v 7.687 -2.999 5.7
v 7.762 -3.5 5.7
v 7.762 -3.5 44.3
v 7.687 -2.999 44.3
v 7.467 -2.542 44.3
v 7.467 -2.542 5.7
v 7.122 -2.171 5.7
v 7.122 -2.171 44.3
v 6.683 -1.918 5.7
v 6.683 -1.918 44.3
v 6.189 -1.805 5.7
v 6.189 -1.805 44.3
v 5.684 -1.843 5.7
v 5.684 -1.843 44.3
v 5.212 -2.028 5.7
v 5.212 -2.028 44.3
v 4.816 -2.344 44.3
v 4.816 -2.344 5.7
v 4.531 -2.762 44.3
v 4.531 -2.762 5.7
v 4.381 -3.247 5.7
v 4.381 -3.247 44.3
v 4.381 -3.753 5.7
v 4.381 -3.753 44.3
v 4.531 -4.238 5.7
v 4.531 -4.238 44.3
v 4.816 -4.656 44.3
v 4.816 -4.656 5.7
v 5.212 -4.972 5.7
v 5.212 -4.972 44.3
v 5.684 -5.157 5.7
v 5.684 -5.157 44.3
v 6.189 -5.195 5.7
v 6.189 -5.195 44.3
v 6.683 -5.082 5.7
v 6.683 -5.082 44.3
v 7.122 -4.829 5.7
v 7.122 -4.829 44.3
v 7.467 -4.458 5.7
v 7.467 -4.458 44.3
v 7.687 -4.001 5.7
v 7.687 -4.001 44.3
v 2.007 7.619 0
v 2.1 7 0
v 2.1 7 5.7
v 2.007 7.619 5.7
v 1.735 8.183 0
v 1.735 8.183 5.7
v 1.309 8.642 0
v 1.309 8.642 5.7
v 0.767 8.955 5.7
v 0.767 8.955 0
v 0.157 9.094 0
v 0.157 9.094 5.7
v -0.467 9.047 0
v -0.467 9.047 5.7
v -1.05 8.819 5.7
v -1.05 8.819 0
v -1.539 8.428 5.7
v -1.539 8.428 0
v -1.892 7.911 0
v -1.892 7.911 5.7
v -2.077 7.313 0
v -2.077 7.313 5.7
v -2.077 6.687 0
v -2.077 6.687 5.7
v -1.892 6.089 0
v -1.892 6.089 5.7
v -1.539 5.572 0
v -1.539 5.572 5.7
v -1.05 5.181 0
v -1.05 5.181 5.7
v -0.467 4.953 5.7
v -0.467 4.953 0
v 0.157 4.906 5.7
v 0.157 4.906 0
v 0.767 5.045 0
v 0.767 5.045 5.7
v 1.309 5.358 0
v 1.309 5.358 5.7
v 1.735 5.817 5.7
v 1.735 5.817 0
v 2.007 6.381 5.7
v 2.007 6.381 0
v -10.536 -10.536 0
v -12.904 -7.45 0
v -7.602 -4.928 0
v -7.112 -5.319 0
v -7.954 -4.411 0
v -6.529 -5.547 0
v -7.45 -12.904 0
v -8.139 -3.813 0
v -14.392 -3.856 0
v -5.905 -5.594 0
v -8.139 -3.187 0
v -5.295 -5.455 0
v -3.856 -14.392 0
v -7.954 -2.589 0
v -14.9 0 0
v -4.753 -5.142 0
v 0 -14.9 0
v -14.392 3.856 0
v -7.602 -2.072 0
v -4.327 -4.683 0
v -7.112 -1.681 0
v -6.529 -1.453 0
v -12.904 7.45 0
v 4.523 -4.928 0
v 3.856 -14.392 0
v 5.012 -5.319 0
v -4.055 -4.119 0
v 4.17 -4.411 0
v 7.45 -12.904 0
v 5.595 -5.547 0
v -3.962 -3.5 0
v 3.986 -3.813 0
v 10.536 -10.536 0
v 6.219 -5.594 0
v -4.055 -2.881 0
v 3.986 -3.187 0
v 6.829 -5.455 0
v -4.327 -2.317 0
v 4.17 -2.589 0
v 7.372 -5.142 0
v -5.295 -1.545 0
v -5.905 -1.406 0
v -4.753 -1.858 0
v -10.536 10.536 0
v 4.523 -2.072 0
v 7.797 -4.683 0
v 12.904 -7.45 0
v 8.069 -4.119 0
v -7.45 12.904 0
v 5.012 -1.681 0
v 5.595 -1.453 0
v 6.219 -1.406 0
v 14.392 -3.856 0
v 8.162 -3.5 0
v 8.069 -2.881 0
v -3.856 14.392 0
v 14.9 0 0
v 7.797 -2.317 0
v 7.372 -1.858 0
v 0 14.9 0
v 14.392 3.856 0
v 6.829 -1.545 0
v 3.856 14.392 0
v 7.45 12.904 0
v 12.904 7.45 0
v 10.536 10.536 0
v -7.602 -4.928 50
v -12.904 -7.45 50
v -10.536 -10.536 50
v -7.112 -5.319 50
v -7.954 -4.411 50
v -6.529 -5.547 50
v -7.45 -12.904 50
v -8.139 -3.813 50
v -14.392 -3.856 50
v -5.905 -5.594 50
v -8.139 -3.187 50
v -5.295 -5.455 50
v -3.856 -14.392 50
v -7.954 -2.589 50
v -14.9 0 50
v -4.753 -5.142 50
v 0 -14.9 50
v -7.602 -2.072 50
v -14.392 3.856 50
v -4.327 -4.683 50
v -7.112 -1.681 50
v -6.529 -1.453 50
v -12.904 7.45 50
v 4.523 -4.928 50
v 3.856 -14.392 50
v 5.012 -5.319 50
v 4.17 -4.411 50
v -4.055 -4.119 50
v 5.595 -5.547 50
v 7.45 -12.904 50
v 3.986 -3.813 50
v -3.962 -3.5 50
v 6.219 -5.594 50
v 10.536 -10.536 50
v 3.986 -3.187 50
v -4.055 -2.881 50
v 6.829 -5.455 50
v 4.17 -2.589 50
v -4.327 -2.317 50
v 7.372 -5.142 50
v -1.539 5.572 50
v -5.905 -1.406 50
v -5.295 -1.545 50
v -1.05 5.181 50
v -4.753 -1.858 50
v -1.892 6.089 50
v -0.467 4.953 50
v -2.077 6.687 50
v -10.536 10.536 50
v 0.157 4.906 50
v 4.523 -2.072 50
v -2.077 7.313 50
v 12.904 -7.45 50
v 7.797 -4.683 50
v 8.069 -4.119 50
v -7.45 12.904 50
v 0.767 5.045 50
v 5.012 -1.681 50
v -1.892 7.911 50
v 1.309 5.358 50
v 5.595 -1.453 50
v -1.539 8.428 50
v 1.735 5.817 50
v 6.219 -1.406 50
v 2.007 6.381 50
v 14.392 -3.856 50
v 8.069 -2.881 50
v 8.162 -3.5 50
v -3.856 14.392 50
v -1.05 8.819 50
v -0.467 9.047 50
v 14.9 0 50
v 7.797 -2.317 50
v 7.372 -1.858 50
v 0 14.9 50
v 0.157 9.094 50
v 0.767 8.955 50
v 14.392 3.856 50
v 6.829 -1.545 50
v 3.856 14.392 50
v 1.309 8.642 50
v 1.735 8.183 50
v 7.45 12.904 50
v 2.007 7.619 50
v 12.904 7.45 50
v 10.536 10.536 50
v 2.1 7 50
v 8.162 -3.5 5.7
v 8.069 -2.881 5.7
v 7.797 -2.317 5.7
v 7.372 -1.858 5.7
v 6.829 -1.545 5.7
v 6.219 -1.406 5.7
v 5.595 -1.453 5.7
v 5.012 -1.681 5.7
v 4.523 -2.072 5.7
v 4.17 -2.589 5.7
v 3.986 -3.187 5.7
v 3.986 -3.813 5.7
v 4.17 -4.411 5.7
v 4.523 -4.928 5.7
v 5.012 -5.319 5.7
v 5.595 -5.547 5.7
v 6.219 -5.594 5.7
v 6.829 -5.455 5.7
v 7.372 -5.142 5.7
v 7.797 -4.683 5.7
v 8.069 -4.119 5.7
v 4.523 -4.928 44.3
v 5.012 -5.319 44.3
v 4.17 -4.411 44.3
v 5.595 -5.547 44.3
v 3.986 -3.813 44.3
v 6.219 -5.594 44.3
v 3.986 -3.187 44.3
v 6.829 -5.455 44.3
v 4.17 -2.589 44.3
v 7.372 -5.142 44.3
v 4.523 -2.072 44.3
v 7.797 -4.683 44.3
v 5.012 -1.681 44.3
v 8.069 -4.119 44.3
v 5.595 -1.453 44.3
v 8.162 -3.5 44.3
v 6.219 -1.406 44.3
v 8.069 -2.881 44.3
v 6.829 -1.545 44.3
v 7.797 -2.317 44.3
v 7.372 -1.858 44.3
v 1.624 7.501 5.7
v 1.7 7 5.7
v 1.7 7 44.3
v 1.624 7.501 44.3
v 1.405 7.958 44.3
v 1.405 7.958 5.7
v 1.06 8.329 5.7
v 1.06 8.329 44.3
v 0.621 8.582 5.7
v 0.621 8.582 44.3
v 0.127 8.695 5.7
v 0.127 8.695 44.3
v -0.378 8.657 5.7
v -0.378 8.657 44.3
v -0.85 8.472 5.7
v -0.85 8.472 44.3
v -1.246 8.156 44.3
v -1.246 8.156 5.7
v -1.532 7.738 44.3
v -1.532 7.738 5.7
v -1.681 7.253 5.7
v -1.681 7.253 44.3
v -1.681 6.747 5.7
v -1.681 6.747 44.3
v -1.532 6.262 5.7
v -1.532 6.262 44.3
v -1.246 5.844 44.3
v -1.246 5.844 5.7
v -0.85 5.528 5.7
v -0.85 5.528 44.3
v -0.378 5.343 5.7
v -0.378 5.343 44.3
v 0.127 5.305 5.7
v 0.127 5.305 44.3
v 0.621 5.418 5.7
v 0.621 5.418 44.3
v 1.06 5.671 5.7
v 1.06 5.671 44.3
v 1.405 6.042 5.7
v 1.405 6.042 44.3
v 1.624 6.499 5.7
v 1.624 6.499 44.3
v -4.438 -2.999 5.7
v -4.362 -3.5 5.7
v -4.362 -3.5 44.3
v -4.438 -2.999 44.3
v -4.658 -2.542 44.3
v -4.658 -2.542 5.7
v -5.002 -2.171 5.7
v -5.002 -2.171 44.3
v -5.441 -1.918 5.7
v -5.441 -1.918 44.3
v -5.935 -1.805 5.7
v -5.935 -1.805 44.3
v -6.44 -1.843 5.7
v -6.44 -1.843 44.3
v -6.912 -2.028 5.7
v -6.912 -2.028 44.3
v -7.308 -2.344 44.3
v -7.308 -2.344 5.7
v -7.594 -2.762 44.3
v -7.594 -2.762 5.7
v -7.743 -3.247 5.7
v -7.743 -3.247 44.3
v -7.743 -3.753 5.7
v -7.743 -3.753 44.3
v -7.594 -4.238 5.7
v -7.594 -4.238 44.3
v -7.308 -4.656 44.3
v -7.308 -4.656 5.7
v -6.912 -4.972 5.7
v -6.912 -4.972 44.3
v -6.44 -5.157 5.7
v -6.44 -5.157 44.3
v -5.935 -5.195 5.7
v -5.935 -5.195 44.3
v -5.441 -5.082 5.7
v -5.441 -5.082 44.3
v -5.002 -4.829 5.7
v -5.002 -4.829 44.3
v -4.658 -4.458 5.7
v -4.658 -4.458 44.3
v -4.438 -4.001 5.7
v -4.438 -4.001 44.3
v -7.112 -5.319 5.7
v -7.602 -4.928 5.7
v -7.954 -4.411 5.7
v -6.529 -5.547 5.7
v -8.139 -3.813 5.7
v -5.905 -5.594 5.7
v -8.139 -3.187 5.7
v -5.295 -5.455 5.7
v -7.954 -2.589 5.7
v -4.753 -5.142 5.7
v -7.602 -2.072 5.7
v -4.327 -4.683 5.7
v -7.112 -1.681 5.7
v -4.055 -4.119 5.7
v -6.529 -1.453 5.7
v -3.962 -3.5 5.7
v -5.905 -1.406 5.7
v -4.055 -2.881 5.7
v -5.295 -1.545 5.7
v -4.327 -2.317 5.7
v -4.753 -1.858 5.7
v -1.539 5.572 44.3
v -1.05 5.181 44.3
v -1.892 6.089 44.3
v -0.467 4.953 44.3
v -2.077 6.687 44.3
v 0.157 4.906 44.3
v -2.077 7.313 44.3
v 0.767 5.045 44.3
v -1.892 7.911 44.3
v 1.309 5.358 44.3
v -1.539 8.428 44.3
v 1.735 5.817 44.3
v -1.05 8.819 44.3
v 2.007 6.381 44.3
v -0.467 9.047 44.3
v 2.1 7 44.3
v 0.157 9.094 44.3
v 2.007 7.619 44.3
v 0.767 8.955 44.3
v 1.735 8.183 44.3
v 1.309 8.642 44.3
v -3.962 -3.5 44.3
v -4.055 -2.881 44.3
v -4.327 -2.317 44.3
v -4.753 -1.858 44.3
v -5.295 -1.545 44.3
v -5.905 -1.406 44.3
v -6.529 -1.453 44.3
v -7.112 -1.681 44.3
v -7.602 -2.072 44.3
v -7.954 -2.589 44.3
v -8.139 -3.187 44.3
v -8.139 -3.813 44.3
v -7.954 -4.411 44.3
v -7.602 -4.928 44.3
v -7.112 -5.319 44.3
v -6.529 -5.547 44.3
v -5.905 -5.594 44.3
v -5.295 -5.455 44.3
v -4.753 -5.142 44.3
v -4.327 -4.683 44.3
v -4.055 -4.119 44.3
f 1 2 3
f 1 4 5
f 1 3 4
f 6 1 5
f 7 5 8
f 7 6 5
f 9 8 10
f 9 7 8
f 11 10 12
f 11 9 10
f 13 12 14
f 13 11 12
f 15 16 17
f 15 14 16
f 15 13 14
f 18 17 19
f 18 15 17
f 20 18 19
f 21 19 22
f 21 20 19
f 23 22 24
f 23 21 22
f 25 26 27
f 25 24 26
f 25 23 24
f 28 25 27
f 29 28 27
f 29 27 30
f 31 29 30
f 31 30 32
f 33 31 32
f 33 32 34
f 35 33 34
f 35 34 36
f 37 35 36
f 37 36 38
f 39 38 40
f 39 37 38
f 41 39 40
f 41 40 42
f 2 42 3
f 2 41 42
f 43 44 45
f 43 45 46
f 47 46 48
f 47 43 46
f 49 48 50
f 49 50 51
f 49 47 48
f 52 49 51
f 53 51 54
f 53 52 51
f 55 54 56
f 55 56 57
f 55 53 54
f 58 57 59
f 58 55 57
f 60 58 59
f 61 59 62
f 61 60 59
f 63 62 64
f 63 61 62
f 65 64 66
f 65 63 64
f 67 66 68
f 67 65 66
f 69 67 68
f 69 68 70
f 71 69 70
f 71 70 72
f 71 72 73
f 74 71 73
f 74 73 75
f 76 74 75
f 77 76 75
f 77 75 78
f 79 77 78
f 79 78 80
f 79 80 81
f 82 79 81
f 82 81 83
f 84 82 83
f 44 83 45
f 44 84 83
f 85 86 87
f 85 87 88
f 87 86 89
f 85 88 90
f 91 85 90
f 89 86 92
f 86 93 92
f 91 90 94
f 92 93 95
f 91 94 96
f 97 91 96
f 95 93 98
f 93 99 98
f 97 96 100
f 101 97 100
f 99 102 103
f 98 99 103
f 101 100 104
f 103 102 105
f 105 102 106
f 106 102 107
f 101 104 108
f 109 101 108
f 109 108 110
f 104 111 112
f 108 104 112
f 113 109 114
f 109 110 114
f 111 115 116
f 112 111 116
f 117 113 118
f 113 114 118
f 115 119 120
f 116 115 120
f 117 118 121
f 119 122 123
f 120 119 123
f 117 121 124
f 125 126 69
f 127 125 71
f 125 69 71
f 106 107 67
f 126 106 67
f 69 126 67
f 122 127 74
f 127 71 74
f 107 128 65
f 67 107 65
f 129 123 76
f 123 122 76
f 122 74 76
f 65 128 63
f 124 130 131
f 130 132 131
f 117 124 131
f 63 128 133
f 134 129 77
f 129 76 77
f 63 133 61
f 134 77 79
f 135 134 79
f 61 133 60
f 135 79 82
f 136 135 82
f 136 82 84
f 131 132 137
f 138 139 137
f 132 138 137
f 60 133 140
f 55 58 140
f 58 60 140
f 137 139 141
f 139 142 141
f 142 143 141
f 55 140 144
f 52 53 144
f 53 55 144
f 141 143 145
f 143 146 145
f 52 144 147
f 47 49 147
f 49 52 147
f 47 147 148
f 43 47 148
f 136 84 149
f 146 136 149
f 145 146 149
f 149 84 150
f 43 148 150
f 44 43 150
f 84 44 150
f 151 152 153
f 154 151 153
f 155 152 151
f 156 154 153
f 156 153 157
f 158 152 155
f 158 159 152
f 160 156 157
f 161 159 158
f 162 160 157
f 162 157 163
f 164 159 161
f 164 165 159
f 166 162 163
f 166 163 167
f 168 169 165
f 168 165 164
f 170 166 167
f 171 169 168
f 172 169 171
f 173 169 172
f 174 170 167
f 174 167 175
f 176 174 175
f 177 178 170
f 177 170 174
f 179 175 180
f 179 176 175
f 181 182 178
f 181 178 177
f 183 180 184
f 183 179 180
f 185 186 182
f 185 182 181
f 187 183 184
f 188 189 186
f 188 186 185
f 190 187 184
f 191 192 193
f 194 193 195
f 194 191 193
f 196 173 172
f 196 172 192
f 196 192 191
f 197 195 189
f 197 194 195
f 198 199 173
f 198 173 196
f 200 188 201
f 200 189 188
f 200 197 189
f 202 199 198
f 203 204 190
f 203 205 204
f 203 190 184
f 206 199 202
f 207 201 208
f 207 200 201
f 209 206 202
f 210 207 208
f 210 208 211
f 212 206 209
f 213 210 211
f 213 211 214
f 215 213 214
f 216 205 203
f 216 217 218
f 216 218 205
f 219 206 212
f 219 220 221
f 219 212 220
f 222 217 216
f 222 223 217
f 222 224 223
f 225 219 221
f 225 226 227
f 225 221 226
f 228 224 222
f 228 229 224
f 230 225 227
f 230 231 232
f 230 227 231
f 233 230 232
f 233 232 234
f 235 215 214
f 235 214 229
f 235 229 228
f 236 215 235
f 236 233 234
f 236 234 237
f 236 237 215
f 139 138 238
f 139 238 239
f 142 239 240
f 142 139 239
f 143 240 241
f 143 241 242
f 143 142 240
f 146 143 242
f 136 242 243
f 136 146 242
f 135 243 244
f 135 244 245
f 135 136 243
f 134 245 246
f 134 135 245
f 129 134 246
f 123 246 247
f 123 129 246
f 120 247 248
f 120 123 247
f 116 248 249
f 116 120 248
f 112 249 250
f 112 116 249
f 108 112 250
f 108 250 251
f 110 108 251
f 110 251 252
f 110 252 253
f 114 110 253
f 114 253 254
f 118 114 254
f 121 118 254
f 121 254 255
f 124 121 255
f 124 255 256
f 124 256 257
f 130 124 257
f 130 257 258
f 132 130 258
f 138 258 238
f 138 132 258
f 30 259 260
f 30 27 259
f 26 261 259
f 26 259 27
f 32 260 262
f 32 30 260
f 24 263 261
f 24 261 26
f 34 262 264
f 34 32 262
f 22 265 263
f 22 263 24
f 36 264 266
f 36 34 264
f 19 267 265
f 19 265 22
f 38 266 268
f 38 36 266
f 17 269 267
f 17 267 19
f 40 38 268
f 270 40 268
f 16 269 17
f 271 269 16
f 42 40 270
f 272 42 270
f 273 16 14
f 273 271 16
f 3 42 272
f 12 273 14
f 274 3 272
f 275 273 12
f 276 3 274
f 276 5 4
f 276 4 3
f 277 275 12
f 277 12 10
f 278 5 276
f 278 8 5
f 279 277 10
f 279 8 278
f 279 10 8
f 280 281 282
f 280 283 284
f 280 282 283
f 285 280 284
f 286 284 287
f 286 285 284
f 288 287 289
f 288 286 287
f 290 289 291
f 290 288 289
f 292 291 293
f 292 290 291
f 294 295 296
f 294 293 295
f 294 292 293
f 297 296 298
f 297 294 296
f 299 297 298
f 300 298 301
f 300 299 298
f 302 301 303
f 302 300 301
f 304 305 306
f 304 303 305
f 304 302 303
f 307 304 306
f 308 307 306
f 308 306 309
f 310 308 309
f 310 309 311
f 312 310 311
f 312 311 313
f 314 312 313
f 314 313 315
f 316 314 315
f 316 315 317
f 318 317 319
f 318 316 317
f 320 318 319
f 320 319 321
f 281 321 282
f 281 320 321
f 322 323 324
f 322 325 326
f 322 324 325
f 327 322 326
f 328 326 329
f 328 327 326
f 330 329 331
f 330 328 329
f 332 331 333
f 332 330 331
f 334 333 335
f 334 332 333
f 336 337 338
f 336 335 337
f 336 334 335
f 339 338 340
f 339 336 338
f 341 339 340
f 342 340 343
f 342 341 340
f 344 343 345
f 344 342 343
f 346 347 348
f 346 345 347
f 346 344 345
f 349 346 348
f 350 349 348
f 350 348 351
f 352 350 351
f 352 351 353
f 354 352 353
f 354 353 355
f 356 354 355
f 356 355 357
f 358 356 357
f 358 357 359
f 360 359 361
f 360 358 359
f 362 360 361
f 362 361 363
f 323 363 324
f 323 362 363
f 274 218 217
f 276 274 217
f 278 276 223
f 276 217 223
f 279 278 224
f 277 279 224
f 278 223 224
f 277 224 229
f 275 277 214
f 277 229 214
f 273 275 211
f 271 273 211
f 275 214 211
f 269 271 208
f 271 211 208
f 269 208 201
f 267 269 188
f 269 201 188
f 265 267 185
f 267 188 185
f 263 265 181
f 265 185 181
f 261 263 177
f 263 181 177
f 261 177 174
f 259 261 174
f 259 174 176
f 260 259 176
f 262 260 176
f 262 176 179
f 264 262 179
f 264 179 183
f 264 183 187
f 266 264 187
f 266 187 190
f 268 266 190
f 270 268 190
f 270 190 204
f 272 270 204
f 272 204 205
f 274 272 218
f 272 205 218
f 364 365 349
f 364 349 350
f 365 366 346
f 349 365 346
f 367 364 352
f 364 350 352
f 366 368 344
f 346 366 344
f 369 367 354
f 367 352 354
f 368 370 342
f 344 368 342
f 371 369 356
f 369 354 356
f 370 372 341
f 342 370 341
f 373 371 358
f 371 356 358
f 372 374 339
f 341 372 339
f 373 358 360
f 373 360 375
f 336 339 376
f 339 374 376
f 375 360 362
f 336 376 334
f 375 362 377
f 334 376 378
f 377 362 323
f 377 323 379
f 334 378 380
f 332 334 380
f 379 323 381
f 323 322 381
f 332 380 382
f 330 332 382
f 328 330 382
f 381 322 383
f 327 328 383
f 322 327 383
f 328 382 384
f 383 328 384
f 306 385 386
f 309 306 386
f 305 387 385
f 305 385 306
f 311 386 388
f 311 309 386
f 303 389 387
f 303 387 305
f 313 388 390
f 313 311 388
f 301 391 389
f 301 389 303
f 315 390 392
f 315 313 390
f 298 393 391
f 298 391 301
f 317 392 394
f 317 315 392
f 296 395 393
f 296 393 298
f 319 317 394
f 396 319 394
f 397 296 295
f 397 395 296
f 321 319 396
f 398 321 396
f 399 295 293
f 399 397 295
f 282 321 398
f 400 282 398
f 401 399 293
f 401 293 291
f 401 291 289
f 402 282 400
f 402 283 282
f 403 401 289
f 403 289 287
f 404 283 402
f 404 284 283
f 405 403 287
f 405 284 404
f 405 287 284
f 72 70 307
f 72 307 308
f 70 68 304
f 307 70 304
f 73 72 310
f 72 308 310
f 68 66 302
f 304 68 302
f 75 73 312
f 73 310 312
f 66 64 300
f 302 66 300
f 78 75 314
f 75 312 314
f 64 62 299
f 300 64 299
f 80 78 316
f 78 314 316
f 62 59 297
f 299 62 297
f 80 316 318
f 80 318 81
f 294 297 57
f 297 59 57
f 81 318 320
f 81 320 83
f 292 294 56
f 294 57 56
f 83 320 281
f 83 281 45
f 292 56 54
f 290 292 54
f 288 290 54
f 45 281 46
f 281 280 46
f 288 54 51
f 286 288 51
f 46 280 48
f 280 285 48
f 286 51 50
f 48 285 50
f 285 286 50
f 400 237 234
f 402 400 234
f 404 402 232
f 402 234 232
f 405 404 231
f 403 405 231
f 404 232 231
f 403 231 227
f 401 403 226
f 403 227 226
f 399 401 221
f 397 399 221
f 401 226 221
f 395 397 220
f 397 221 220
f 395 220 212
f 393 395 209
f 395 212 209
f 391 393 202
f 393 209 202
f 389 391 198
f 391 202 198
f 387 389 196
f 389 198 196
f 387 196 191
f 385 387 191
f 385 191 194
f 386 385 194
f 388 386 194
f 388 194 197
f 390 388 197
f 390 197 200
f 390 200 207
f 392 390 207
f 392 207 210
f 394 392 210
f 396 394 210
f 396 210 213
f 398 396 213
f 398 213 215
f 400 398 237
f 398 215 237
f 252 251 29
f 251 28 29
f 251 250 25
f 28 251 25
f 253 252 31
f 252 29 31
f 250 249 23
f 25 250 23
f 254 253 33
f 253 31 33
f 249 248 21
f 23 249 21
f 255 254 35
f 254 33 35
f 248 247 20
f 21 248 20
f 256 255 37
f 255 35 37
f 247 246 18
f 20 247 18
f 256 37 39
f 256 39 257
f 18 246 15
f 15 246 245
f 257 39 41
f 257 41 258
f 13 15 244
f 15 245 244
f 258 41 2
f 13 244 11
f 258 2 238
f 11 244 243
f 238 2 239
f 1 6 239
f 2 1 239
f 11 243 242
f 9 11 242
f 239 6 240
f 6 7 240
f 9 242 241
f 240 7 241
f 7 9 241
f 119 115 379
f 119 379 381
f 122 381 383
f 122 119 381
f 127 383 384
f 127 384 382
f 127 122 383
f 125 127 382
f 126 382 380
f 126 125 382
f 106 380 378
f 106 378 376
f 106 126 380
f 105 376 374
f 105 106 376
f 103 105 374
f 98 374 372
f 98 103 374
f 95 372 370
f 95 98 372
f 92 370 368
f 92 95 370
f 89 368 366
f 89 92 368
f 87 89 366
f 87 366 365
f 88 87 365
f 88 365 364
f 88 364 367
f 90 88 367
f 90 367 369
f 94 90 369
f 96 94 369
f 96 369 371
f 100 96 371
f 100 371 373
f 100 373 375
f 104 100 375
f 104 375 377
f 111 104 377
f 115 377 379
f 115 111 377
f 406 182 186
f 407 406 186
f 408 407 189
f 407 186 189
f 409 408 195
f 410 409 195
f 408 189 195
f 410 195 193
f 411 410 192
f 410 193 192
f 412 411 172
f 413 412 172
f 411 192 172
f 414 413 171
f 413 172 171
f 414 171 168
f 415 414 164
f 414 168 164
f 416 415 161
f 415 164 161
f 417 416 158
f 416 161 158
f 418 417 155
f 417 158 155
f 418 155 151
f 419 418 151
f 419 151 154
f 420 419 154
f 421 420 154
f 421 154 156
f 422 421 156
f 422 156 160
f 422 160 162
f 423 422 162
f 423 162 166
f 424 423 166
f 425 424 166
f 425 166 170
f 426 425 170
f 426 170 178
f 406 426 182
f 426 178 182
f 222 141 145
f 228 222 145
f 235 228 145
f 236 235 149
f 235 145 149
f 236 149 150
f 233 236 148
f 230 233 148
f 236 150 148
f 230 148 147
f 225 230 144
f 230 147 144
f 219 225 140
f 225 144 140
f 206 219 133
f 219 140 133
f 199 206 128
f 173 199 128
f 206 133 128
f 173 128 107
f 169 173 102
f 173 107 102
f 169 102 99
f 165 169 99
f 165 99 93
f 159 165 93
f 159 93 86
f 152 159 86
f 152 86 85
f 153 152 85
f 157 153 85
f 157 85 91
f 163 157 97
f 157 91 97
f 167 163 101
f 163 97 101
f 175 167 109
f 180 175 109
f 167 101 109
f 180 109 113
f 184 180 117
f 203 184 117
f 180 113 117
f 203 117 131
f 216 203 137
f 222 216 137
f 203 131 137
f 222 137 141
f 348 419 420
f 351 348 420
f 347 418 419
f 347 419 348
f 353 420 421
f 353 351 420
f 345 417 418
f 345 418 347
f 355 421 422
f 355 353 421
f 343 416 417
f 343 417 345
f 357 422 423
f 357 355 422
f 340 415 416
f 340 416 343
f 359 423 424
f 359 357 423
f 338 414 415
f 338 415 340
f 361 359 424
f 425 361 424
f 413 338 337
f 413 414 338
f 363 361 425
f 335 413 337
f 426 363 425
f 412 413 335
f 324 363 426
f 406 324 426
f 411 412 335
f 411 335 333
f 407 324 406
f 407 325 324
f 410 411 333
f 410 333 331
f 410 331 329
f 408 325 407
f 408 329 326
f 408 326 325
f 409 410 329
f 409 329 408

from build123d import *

# Parameters (mm, degrees)
SKETCH2_R           = 14.9
SKETCH2_R_2         = 1.7
BOSS_EXTRUDE1_DEPTH = 50
SKETCH3_R           = 2.1
CUT_EXTRUDE1_DEPTH  = 5.7


with BuildPart() as part:
    # Sketch2 → Boss-Extrude1 (new body)
    with BuildSketch(Plane.XY):
        Circle(SKETCH2_R)
        with Locations((0, 7)):
            Circle(SKETCH2_R_2, mode=Mode.SUBTRACT)
        with Locations((6.062177826, -3.5)):
            Circle(SKETCH2_R_2, mode=Mode.SUBTRACT)
        with Locations((-6.062177826, -3.5)):
            Circle(SKETCH2_R_2, mode=Mode.SUBTRACT)
    extrude(amount=BOSS_EXTRUDE1_DEPTH)

    # Sketch3 → Cut-Extrude1 (cut)
    with BuildSketch(Plane.XY.offset(50)):
        with Locations((0, 7)):
            Circle(SKETCH3_R)
        with Locations((6.062177826, -3.5)):
            Circle(SKETCH3_R)
        with Locations((-6.062177826, -3.5)):
            Circle(SKETCH3_R)
    cut_extrude1 = extrude(amount=-CUT_EXTRUDE1_DEPTH, mode=Mode.SUBTRACT)

    # Mirror1: Cut-Extrude1 across plane
    add(cut_extrude1.mirror(Plane.XY.offset(25)), mode=Mode.SUBTRACT)


solid = part.part
